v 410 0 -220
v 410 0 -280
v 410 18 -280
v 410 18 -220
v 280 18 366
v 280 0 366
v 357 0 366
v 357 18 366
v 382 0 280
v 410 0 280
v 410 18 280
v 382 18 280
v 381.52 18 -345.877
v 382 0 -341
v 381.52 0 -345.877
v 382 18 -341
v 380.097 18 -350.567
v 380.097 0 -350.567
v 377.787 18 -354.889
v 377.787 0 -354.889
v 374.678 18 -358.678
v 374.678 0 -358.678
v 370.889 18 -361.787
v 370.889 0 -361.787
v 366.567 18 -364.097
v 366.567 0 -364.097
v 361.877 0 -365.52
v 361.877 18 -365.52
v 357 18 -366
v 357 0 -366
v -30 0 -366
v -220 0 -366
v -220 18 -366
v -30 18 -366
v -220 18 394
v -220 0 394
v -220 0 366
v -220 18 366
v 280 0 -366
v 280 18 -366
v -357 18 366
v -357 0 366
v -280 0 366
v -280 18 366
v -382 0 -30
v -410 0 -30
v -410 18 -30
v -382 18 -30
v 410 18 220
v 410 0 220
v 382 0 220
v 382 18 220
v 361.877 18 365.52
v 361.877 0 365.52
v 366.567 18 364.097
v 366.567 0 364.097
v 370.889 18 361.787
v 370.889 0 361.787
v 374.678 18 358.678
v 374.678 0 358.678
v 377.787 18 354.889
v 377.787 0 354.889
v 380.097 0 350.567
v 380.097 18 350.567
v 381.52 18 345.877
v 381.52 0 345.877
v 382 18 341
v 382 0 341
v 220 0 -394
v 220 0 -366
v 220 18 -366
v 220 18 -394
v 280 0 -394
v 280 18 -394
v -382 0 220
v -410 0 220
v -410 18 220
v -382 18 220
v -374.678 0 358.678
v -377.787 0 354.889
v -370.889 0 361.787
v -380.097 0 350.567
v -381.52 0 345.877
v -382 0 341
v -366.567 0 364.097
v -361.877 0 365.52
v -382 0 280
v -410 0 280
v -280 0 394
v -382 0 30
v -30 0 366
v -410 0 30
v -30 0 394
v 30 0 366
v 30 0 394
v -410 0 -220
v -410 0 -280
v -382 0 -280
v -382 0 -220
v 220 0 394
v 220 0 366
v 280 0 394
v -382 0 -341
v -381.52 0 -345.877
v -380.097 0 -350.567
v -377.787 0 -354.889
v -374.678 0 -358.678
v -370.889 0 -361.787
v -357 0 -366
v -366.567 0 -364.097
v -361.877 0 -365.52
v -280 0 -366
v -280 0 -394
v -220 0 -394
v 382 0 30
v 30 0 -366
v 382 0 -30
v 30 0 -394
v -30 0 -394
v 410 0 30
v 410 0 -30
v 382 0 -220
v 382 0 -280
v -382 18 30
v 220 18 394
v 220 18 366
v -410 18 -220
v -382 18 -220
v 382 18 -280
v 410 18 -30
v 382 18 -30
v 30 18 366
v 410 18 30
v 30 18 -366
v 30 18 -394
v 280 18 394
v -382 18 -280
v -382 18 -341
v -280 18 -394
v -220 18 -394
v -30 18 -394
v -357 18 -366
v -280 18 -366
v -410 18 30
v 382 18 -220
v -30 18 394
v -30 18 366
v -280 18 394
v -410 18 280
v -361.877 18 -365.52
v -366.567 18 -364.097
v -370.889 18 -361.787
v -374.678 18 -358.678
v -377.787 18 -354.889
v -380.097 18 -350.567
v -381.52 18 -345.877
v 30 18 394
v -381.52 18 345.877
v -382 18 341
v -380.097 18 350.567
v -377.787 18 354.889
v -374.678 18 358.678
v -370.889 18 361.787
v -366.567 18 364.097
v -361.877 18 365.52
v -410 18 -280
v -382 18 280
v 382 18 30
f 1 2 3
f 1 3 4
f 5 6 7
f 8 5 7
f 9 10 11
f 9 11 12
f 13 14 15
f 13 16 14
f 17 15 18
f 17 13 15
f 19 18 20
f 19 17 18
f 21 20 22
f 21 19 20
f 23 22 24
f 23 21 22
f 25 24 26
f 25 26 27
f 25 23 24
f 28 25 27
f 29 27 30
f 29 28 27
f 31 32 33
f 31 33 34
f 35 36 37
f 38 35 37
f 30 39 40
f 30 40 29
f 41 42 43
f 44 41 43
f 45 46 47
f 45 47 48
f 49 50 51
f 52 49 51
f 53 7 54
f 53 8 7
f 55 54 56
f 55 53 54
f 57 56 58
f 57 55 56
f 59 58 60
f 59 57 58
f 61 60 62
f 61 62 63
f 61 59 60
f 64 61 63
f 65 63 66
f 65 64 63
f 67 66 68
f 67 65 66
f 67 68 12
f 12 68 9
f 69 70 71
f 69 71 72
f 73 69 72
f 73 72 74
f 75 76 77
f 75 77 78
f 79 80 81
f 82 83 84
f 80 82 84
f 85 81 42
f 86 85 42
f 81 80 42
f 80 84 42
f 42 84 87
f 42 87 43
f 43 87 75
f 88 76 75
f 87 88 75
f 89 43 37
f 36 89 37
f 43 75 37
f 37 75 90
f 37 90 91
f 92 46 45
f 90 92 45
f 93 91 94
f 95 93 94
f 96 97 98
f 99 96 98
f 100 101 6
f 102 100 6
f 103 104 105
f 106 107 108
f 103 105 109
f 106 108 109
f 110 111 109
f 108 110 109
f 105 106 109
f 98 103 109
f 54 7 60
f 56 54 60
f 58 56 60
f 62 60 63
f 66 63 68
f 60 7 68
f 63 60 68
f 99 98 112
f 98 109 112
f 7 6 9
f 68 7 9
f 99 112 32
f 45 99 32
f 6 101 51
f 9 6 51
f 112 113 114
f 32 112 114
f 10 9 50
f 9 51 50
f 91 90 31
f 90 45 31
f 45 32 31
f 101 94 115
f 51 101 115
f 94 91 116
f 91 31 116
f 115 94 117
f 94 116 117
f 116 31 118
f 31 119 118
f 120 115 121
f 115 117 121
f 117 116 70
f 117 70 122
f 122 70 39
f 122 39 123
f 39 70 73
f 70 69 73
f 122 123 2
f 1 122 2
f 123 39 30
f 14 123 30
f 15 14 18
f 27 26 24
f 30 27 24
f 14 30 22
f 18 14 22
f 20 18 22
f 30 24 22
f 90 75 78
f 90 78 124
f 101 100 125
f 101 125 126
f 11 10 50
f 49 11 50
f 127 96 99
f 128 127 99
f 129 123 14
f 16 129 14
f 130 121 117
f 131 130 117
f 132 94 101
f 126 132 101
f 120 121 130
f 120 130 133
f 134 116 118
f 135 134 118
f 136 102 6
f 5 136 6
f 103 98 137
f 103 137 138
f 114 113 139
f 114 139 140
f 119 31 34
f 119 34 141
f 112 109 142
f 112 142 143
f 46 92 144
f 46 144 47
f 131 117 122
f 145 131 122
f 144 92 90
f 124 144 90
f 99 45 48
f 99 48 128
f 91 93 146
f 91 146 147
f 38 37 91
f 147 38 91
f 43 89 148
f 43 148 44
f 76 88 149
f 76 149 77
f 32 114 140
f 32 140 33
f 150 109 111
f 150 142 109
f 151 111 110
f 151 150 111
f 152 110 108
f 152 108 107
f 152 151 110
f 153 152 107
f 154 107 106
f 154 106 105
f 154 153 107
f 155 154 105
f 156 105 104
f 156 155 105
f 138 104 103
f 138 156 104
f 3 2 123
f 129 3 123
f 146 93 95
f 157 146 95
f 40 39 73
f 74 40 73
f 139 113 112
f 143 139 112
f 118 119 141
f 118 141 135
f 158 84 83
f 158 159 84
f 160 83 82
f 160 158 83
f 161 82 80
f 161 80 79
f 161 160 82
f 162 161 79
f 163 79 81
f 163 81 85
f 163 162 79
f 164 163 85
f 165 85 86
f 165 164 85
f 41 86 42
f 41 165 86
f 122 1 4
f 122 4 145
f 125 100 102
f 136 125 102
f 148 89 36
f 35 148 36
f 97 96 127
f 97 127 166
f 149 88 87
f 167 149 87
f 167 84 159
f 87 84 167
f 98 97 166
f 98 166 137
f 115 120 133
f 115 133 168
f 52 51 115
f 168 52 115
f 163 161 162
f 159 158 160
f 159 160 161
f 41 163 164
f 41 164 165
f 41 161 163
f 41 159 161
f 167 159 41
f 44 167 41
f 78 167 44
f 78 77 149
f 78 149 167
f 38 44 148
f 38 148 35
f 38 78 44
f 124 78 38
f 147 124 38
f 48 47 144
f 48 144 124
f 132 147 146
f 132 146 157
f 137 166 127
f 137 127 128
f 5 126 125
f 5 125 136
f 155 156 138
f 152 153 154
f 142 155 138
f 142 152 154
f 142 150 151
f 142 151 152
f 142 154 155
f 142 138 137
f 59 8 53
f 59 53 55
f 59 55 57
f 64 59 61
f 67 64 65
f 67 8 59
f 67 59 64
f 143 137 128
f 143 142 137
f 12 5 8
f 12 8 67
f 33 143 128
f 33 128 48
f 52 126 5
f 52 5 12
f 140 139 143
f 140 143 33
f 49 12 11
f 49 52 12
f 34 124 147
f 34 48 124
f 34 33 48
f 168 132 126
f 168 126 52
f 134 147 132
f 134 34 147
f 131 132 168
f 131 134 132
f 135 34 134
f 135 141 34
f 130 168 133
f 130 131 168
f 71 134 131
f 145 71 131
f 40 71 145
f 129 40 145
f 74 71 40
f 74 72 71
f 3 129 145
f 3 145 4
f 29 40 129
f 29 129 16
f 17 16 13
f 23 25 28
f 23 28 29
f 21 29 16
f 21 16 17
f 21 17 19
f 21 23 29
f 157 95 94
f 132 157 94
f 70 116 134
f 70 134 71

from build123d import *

# Parameters (mm, degrees)
SKETCH_1_W               = 764
SKETCH_1_H               = 732
EXTRUDE_1_DEPTH          = 18
SKETCH_1_3_W             = 28
SKETCH_1_3_H             = 60
EXTRUDE_2_DEPTH          = 18
PATTERN_LINEAR_1_COUNT   = 3
PATTERN_LINEAR_1_PITCH   = 250
MIRROR_1_COPY_1_SKETCH_W = 28
MIRROR_1_COPY_1_SKETCH_H = 60
MIRROR_1_COPY_1_DEPTH    = 18
MIRROR_1_COPY_2_SKETCH_W = 28
MIRROR_1_COPY_2_SKETCH_H = 60
MIRROR_1_COPY_2_DEPTH    = 18
SKETCH_1_5_W             = 60
SKETCH_1_5_H             = 28
EXTRUDE_3_DEPTH          = 18
PATTERN_LINEAR_2_COUNT   = 3
PATTERN_LINEAR_2_PITCH   = 250
MIRROR_2_COPY_1_SKETCH_W = 60
MIRROR_2_COPY_1_SKETCH_H = 28
MIRROR_2_COPY_1_DEPTH    = 18
MIRROR_2_COPY_2_SKETCH_W = 60
MIRROR_2_COPY_2_SKETCH_H = 28
MIRROR_2_COPY_2_DEPTH    = 18
FILLET_1_R               = 25


with BuildPart() as part:
    # 草图1 → 凸台-拉伸1 (new body)
    with BuildSketch(Plane(origin=(0, 0, 0), x_dir=(1, 0, 0), z_dir=(0, 1, 0))):
        Rectangle(SKETCH_1_W, SKETCH_1_H)
    extrude(amount=EXTRUDE_1_DEPTH)

    # 草图1<3> → 凸台-拉伸2 (add)
    with BuildSketch(Plane(origin=(0, 0, 0), x_dir=(1, 0, 0), z_dir=(0, 1, 0))):
        with Locations((-396, -250)):
            Rectangle(SKETCH_1_3_W, SKETCH_1_3_H)
    extrude_2 = extrude(amount=EXTRUDE_2_DEPTH)

    # 阵列(线性)1: 凸台-拉伸2 ×3
    with Locations(*[(0, 0, -i * PATTERN_LINEAR_1_PITCH) for i in range(1, PATTERN_LINEAR_1_COUNT)]):
        add(extrude_2)

    # 镜向1: 凸台-拉伸2 across plane
    add(extrude_2.mirror(Plane(origin=(0, 0, 0), x_dir=(0, 0, 1), z_dir=(1, 0, 0))))

    # 镜向1 copy 1 sketch → 镜向1 copy 1 (add)
    with BuildSketch(Plane(origin=(0, 0, -250), x_dir=(-1, 0, 0), z_dir=(0, 1, 0))):
        with Locations((-396, 250)):
            Rectangle(MIRROR_1_COPY_1_SKETCH_W, MIRROR_1_COPY_1_SKETCH_H)
    extrude(amount=MIRROR_1_COPY_1_DEPTH)

    # 镜向1 copy 2 sketch → 镜向1 copy 2 (add)
    with BuildSketch(Plane(origin=(0, 0, -500), x_dir=(-1, 0, 0), z_dir=(0, 1, 0))):
        with Locations((-396, 250)):
            Rectangle(MIRROR_1_COPY_2_SKETCH_W, MIRROR_1_COPY_2_SKETCH_H)
    extrude(amount=MIRROR_1_COPY_2_DEPTH)

    # 草图1<5> → 凸台-拉伸3 (add)
    with BuildSketch(Plane(origin=(0, 0, 0), x_dir=(1, 0, 0), z_dir=(0, 1, 0))):
        with Locations((-250, -380)):
            Rectangle(SKETCH_1_5_W, SKETCH_1_5_H)
    extrude_3 = extrude(amount=EXTRUDE_3_DEPTH)

    # 阵列(线性)2: 凸台-拉伸3 ×3
    with Locations(*[(i * PATTERN_LINEAR_2_PITCH, 0, 0) for i in range(1, PATTERN_LINEAR_2_COUNT)]):
        add(extrude_3)

    # 镜向2: 凸台-拉伸3 across plane
    add(extrude_3.mirror(Plane.XY))

    # 镜向2 copy 1 sketch → 镜向2 copy 1 (add)
    with BuildSketch(Plane(origin=(250, 0, 0), x_dir=(1, 0, 0), z_dir=(0, 1, 0))):
        with Locations((-250, 380)):
            Rectangle(MIRROR_2_COPY_1_SKETCH_W, MIRROR_2_COPY_1_SKETCH_H)
    extrude(amount=MIRROR_2_COPY_1_DEPTH)

    # 镜向2 copy 2 sketch → 镜向2 copy 2 (add)
    with BuildSketch(Plane(origin=(500, 0, 0), x_dir=(1, 0, 0), z_dir=(0, 1, 0))):
        with Locations((-250, 380)):
            Rectangle(MIRROR_2_COPY_2_SKETCH_W, MIRROR_2_COPY_2_SKETCH_H)
    extrude(amount=MIRROR_2_COPY_2_DEPTH)

    # 圆角1
    fillet_1_edges = [part.edges().sort_by_distance(p)[0] for p in [
        (-382, 9, -366),
        (-382, 9, 366),
        (382, 9, 366),
        (382, 9, -366),
    ]]
    fillet(fillet_1_edges, radius=FILLET_1_R)


solid = part.part
